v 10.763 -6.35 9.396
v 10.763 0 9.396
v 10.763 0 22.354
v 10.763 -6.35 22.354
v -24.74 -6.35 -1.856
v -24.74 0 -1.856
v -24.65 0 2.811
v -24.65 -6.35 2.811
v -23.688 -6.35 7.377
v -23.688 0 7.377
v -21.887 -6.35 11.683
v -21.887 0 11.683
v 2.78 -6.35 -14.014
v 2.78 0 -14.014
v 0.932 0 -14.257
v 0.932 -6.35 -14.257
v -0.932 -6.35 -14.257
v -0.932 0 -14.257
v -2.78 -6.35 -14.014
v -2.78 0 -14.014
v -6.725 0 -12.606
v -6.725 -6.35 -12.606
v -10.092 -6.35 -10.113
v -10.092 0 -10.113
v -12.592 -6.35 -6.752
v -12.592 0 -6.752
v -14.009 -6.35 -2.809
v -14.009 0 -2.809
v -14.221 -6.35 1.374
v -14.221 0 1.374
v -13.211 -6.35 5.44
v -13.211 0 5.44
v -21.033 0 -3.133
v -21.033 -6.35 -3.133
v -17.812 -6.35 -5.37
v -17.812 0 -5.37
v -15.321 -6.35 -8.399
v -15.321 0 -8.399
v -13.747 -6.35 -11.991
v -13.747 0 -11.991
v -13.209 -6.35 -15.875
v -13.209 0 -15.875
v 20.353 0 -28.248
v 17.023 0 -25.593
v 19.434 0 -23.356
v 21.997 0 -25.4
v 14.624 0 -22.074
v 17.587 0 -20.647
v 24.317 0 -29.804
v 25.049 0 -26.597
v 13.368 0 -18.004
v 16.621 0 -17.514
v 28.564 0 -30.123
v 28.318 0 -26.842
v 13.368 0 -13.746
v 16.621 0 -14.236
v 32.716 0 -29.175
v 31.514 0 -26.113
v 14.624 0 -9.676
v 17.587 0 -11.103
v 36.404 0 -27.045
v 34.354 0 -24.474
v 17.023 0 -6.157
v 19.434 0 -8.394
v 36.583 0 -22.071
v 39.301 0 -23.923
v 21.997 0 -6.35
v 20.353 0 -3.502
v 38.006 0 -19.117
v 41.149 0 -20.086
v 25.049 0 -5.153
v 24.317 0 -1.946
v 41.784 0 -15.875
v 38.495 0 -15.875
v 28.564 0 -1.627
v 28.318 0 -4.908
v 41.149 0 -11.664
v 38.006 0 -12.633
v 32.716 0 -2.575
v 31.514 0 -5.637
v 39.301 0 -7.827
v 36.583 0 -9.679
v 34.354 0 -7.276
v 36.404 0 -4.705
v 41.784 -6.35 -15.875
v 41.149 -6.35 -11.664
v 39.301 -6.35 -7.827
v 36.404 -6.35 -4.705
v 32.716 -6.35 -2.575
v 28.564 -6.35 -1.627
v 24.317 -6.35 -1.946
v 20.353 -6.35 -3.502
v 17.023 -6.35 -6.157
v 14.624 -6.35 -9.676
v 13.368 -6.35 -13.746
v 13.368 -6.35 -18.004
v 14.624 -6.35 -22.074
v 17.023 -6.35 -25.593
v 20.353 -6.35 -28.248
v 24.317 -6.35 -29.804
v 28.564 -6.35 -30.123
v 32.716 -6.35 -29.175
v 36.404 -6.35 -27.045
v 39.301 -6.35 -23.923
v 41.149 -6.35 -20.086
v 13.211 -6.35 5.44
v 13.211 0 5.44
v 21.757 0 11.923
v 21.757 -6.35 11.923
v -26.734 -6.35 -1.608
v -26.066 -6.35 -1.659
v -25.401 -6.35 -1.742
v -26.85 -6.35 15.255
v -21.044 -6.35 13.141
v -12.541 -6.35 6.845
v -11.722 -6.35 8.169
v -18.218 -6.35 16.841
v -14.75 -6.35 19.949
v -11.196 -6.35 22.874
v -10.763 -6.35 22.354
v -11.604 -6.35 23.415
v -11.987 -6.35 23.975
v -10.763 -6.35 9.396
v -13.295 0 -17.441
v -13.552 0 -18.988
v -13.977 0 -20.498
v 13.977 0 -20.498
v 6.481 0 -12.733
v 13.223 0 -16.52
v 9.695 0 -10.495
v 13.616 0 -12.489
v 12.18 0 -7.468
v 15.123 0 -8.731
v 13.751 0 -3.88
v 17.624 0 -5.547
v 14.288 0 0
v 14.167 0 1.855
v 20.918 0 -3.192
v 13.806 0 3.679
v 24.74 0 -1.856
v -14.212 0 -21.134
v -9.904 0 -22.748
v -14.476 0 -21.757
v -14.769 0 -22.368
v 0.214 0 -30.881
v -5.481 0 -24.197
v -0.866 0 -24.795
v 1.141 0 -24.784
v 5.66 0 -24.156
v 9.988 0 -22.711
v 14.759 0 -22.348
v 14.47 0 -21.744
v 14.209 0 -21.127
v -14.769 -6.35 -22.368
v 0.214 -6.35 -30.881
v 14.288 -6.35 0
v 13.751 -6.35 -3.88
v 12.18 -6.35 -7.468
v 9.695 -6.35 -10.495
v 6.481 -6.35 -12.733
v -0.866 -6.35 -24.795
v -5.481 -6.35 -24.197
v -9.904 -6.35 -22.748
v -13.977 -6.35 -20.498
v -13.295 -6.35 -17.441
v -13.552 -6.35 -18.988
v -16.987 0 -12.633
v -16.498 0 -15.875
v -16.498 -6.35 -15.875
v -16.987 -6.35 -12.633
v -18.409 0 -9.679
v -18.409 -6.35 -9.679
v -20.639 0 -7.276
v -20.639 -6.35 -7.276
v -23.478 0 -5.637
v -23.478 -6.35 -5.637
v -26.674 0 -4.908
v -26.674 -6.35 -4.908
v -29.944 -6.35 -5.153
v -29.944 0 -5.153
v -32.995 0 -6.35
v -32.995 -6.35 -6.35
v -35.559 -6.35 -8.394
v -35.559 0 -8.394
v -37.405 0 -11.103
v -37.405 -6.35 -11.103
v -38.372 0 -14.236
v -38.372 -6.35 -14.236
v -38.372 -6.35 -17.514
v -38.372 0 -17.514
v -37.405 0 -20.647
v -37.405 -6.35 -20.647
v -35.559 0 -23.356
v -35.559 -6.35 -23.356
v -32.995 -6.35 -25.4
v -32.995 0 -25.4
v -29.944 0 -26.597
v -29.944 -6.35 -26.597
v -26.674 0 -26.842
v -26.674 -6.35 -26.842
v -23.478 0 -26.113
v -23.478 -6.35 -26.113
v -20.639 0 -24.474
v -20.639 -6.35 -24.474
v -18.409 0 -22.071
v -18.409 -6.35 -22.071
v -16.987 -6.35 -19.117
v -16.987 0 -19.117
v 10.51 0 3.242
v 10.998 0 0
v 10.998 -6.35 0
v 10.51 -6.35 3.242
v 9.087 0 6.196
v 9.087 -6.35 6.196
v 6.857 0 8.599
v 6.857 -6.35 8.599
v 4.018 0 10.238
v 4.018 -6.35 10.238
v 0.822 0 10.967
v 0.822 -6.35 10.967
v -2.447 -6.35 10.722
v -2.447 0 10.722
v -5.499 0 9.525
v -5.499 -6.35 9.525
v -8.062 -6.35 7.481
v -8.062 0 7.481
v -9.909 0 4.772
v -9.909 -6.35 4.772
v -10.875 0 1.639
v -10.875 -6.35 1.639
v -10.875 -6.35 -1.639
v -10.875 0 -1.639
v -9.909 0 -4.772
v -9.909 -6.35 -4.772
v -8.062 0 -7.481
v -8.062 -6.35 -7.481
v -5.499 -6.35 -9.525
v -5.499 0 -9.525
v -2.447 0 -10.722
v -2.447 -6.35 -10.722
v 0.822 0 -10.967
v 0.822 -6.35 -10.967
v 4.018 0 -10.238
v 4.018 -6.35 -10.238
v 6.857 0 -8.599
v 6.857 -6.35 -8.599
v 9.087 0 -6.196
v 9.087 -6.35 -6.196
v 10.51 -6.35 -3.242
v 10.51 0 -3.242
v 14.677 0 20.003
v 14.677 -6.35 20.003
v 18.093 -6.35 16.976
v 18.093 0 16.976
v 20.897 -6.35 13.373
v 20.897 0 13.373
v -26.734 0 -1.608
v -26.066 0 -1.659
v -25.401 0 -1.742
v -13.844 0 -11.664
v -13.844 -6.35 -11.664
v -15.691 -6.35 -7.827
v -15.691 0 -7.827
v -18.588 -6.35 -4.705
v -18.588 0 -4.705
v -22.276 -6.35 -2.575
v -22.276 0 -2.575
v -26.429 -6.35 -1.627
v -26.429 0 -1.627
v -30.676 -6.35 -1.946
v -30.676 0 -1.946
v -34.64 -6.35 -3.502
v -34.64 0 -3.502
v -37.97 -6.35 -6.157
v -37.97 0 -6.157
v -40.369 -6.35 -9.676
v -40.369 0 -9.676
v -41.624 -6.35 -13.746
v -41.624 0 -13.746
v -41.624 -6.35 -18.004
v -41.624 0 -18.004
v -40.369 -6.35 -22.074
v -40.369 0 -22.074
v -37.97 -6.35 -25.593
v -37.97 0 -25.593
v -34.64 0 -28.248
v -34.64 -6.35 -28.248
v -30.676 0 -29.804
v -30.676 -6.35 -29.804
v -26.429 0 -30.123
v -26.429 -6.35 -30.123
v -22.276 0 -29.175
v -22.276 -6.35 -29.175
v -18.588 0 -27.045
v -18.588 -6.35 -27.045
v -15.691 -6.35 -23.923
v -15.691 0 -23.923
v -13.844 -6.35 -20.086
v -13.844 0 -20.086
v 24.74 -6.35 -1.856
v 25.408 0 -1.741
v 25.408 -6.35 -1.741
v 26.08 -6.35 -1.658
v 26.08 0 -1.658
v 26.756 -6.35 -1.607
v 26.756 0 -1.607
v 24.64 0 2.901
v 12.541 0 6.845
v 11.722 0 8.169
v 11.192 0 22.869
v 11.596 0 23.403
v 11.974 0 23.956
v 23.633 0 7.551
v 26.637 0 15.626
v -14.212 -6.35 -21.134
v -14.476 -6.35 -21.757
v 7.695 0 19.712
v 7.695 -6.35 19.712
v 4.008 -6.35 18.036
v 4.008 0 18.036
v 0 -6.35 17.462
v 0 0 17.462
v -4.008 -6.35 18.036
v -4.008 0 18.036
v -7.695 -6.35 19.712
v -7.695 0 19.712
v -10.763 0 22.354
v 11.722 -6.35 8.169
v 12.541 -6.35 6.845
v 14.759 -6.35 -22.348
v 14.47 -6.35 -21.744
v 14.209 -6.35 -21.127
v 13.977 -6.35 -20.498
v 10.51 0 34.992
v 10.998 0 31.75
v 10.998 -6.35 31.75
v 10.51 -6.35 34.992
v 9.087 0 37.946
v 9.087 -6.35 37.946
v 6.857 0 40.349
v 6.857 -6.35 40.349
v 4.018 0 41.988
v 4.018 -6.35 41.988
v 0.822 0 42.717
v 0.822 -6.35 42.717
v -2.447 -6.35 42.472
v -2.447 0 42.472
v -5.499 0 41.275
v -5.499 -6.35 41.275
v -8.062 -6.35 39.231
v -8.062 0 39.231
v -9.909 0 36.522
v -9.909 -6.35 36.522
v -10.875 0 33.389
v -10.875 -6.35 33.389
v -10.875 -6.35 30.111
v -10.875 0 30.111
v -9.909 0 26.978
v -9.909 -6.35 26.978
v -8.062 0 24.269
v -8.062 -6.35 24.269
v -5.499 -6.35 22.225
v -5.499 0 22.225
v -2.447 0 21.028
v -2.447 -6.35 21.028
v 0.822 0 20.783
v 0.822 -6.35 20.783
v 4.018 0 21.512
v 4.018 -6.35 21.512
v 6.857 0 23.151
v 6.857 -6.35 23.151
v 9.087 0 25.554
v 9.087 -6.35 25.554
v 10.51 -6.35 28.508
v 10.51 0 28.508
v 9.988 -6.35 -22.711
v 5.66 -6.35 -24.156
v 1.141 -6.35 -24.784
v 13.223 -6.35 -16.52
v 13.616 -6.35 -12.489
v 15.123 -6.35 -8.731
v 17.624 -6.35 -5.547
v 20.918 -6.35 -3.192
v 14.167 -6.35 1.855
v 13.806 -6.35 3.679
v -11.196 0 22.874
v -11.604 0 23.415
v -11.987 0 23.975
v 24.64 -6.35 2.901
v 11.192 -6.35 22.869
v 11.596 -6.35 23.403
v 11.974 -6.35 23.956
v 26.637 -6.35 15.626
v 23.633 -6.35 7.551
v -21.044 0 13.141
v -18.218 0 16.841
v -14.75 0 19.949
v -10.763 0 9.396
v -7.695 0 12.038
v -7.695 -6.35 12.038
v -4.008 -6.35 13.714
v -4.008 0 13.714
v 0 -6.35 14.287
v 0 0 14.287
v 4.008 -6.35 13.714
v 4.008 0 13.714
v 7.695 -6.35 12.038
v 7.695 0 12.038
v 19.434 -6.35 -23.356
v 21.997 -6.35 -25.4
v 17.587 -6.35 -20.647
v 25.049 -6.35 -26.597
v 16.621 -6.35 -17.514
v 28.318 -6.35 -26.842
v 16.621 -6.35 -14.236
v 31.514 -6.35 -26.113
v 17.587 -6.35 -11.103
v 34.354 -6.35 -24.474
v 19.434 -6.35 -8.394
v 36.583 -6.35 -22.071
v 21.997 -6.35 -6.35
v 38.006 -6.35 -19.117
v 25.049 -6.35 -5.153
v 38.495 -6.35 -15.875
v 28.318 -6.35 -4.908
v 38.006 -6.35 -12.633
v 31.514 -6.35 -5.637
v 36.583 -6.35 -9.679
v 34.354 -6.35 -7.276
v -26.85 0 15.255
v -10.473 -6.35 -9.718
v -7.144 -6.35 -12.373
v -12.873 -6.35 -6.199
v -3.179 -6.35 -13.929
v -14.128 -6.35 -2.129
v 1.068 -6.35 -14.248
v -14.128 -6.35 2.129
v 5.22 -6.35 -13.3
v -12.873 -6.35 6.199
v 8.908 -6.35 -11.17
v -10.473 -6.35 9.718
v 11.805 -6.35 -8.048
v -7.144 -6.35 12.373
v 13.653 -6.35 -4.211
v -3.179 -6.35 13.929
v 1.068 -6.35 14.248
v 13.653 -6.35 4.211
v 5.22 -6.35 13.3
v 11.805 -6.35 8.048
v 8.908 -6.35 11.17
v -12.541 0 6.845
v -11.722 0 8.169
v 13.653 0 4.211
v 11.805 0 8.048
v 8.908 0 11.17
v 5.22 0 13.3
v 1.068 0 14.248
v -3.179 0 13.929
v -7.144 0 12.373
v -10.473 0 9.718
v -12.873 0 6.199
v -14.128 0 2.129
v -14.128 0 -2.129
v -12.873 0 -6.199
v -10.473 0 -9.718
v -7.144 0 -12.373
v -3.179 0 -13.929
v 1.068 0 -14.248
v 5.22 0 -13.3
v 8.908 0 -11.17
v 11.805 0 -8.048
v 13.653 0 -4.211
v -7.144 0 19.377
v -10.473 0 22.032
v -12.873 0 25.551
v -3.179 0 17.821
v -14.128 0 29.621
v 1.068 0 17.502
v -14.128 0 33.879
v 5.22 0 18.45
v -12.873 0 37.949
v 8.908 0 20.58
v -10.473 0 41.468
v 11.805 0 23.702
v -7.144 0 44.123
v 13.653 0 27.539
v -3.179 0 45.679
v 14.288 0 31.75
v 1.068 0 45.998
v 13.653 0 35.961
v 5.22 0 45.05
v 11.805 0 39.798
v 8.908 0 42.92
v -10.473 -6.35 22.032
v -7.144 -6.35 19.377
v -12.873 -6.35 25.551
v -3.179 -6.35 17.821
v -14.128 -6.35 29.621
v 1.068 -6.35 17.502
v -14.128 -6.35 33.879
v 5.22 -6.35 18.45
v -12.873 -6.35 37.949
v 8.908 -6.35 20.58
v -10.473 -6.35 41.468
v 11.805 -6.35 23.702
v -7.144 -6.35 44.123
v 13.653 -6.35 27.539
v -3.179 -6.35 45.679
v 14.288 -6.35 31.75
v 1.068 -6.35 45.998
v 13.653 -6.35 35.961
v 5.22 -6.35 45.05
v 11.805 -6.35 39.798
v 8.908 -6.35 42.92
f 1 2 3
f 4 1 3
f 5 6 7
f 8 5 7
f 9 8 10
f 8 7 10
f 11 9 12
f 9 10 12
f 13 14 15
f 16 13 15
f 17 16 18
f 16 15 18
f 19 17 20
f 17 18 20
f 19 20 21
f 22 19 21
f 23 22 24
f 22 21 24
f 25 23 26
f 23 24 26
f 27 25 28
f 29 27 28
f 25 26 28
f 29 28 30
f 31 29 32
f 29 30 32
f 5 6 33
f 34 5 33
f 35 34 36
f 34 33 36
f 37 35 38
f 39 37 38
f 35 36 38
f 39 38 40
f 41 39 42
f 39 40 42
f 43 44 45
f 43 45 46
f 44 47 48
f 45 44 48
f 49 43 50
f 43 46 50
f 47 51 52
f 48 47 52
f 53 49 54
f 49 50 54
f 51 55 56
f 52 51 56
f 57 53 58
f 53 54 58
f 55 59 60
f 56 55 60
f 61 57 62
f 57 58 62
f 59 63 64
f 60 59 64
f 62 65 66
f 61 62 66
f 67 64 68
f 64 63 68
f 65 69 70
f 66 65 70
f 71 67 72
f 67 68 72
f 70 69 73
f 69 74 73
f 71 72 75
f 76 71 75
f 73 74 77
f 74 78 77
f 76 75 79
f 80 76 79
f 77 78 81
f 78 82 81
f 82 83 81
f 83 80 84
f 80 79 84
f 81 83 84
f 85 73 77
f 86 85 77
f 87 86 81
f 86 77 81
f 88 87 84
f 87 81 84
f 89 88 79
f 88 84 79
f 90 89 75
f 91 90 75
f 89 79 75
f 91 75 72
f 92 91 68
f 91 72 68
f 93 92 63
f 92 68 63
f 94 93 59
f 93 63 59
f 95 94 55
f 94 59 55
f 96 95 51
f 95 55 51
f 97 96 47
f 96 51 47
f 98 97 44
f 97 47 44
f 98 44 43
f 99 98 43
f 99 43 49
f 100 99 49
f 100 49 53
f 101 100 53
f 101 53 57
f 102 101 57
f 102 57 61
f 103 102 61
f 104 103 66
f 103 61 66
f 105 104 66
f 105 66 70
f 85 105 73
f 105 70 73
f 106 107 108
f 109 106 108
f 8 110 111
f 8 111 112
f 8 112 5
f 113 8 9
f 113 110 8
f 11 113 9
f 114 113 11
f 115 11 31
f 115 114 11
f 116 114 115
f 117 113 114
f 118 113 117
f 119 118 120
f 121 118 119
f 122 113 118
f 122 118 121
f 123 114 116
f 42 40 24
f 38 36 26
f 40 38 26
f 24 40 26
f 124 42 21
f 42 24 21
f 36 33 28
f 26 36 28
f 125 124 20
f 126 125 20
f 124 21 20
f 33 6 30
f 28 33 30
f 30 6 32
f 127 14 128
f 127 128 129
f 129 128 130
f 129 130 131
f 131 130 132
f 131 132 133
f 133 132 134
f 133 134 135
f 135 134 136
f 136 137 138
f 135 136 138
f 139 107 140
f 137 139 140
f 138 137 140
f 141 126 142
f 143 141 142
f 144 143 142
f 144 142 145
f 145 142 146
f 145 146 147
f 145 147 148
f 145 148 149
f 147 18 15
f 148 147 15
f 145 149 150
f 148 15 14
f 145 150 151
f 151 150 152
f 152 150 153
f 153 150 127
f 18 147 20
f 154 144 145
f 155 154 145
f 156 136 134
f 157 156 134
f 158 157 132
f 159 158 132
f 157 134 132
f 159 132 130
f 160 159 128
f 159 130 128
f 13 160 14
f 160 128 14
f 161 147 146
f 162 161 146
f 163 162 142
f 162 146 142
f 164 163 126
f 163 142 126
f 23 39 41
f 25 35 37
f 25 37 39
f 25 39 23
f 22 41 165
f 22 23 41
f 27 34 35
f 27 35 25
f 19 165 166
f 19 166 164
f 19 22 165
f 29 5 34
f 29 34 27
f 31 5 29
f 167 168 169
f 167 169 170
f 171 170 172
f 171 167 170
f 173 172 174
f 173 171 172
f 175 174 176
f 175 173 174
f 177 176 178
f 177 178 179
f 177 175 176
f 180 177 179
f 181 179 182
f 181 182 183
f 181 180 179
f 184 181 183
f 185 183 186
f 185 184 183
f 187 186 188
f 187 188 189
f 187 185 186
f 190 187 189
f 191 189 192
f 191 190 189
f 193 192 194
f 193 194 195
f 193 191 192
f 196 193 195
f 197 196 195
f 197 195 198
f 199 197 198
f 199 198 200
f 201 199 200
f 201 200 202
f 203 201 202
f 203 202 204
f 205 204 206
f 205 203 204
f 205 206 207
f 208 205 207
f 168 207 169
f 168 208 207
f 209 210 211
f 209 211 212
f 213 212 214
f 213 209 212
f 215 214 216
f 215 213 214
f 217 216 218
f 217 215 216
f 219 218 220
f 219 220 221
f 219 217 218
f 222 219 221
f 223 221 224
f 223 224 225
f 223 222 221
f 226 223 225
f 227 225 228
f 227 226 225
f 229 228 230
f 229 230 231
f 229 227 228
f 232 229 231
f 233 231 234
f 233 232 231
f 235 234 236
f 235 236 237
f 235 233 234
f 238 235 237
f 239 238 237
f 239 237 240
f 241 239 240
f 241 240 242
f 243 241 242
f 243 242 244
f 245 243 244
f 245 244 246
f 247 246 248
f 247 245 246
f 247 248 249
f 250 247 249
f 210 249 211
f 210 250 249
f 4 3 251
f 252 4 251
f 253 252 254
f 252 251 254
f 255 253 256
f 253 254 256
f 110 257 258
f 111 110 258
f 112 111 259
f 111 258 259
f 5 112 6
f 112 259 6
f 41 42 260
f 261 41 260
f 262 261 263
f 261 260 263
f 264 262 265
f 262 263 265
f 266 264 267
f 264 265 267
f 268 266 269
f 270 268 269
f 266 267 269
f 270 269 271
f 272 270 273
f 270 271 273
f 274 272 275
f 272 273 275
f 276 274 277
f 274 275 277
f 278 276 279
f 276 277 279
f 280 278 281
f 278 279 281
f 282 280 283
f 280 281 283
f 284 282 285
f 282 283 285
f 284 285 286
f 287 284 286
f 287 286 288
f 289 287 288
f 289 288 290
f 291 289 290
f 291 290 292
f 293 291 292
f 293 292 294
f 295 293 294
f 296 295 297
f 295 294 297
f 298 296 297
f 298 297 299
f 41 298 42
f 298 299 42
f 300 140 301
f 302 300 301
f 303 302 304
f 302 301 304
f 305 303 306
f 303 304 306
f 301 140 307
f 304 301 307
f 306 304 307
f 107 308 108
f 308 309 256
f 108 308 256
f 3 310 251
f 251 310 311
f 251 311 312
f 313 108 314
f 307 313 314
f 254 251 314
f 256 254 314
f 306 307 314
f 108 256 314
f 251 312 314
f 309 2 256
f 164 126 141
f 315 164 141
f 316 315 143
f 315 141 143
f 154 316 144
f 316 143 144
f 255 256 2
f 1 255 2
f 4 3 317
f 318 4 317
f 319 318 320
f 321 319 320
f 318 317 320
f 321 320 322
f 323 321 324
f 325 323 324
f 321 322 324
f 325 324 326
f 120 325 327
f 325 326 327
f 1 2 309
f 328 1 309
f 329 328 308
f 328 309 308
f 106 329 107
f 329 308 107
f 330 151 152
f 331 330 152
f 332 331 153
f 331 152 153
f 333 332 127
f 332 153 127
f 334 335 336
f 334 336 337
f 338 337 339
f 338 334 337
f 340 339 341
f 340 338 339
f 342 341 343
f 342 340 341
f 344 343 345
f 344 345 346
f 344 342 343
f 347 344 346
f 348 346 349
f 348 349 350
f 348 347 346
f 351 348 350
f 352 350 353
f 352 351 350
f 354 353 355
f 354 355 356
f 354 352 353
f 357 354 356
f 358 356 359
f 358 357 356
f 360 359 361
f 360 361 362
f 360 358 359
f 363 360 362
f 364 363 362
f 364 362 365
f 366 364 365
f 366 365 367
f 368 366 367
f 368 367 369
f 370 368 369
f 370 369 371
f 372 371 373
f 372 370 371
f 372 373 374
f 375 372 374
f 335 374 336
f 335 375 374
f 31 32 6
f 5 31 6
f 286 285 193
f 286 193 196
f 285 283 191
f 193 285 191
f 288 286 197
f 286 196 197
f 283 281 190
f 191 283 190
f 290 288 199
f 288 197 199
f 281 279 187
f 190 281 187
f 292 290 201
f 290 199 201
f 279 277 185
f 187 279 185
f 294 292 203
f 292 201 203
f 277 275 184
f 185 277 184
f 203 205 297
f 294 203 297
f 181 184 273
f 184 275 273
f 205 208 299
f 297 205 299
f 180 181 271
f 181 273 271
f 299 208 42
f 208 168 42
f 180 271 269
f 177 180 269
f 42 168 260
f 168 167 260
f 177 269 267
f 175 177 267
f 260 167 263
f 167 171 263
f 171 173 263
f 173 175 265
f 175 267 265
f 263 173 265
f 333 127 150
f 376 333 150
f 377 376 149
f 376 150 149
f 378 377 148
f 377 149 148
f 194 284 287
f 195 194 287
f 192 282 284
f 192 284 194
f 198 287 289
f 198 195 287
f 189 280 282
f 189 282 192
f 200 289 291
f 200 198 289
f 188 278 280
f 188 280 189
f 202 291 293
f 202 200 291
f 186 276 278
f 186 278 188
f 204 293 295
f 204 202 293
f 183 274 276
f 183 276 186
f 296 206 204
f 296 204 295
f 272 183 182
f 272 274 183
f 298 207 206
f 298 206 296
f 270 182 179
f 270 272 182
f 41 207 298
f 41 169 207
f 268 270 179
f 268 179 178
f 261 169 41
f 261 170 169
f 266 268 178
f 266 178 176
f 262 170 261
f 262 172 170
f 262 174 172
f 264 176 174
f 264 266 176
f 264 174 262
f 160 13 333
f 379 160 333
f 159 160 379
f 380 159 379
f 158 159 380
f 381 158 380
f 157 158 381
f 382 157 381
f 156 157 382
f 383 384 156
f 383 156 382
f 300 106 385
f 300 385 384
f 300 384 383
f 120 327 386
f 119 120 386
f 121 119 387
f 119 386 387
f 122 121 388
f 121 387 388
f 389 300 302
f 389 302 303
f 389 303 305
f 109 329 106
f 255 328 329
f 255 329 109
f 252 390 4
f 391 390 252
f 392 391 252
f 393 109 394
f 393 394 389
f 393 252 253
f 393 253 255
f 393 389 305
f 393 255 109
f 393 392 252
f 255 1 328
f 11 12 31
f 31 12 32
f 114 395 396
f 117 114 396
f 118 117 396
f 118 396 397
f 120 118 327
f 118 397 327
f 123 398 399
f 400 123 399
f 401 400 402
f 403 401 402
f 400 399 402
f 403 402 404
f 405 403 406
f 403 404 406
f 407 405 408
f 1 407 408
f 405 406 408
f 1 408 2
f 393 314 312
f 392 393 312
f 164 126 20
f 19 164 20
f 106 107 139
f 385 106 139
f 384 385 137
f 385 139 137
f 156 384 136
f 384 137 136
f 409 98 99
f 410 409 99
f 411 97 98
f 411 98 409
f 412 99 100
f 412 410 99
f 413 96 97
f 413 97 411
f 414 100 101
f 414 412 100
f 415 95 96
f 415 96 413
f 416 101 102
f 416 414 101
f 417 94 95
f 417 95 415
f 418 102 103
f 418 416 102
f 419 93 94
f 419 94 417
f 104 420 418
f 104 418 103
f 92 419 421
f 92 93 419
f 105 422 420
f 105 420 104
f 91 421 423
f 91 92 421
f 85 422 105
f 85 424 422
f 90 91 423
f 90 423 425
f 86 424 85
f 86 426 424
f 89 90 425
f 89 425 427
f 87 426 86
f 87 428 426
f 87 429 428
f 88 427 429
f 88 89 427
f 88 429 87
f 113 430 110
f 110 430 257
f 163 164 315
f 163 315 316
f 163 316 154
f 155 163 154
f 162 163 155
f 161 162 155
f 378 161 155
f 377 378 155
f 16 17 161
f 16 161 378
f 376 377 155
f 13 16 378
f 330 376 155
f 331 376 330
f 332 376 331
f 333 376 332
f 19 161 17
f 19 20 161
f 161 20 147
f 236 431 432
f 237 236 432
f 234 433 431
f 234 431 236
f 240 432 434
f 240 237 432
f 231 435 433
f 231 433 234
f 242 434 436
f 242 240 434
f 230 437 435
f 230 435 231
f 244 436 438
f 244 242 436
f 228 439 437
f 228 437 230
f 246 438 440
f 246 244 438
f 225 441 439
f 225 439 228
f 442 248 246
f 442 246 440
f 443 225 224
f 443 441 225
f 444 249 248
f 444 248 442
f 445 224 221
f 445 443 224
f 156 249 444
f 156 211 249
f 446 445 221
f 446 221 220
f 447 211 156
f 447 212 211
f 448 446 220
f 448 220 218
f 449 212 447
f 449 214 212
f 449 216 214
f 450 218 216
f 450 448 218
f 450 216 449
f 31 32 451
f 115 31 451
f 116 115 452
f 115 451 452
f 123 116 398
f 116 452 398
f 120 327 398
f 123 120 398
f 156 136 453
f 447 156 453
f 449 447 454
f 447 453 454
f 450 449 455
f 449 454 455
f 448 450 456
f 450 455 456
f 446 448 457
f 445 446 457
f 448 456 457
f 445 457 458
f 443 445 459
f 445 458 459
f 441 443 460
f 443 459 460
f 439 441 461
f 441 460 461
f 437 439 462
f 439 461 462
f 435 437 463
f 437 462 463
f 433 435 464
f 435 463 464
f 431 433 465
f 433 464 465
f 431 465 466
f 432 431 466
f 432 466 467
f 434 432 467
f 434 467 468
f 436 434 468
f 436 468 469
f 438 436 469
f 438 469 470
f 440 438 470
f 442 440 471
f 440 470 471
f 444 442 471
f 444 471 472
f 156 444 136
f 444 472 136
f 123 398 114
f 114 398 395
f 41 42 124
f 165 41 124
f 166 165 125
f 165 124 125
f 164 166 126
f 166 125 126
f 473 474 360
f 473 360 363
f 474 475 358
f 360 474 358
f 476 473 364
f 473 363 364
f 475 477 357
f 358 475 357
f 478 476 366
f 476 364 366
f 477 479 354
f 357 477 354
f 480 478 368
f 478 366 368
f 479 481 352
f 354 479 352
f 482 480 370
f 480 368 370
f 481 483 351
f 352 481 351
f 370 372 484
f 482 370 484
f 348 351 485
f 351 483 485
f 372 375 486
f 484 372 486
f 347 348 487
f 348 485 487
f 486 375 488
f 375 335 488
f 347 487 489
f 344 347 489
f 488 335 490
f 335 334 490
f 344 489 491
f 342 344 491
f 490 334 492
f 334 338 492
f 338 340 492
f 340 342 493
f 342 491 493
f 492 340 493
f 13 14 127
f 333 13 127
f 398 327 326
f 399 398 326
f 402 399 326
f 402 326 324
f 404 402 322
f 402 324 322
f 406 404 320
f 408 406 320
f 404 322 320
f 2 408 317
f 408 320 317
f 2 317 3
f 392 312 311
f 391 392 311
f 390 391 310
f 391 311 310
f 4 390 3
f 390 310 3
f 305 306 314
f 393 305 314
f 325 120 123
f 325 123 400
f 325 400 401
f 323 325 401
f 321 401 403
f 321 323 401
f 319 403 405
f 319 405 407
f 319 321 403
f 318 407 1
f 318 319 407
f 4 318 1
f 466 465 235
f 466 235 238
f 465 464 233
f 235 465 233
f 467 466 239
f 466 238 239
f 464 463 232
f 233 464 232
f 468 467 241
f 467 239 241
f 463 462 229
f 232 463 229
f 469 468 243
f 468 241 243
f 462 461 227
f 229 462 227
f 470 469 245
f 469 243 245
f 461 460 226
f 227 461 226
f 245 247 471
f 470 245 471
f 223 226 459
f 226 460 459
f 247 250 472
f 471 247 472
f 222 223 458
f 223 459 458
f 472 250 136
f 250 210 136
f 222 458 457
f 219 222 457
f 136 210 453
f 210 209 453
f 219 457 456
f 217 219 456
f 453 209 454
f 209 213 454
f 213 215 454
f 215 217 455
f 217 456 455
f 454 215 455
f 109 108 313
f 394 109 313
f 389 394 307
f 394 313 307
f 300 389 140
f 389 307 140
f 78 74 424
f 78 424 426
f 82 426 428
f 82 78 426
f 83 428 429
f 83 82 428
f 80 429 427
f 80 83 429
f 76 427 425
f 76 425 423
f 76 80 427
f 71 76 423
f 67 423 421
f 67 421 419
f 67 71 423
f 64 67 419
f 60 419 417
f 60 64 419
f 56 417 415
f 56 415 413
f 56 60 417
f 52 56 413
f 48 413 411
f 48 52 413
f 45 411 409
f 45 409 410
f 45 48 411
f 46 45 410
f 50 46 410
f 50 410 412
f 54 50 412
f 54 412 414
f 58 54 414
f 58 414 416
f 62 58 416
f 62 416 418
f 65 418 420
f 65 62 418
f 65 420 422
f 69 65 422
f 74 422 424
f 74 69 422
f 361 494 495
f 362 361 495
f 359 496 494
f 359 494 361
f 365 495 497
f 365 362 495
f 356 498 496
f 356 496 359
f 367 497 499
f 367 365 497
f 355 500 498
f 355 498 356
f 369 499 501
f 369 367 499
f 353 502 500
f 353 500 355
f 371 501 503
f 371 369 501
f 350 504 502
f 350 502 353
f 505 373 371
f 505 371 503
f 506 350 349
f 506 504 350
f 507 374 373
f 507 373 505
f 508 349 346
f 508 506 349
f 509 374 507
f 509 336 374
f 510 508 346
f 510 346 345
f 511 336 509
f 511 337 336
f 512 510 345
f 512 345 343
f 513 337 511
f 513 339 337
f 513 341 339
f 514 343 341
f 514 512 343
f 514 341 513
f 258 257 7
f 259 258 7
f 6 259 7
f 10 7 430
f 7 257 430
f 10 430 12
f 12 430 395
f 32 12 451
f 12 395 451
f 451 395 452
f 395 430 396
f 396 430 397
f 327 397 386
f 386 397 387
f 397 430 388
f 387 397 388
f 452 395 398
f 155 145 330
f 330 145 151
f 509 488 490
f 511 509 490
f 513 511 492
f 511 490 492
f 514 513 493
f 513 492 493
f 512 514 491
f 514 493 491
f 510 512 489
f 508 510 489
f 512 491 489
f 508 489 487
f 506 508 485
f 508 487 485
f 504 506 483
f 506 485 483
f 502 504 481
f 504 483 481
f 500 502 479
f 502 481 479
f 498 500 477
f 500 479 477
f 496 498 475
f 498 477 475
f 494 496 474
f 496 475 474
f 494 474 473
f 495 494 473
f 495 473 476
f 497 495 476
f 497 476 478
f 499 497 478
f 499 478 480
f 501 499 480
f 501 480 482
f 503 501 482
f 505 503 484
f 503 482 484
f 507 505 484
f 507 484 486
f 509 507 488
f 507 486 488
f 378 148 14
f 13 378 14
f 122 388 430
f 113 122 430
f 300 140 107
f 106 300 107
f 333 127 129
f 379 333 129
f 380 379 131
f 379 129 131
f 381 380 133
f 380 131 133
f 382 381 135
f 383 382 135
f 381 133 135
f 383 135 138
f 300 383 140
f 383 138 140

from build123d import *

# Parameters (mm, degrees)
F0_R     = 14.2875
F0_R_2   = 10.9982
F2_DEPTH = 6.35


with BuildPart() as f2:
    # F0 (on Front) → F2 (new body)
    with BuildSketch(Plane.XZ):
        with Locations((27.4963065702, -15.875)):
            Circle(F0_R)
        with Locations((27.4963065702, -15.875)):
            Circle(F0_R_2, mode=Mode.SUBTRACT)
    extrude(amount=F2_DEPTH)


with BuildPart() as f2b:
    # F0 (on Front) → F2, piece 2 (new body)
    with BuildSketch(Plane.XZ):
        Circle(F0_R)
        Circle(F0_R_2, mode=Mode.SUBTRACT)
    extrude(amount=F2_DEPTH)


with BuildPart() as f2c:
    # F0 (on Front) → F2, piece 3 (new body)
    with BuildSketch(Plane.XZ):
        with Locations((0, 31.75)):
            Circle(F0_R)
        with Locations((0, 31.75)):
            Circle(F0_R_2, mode=Mode.SUBTRACT)
    extrude(amount=F2_DEPTH)


with BuildPart() as f2d:
    # F0 (on Front) → F2, piece 4 (new body)
    with BuildSketch(Plane.XZ):
        with Locations((-27.4963065702, -15.875)):
            Circle(F0_R)
        with Locations((-27.4963065702, -15.875)):
            Circle(F0_R_2, mode=Mode.SUBTRACT)
    extrude(amount=F2_DEPTH)


with BuildPart() as f2e:
    # F1 (on Front) → F2, piece 5 (new body)
    with BuildSketch(Plane.XZ):
        with BuildLine():
            Line((24.7404177955, -1.8558083931), (13.2113221809, 5.4400020663))
            ThreePointArc((13.2113221809, 5.4400020663), (14.0158735352, 2.7727144272), (14.2875, 0))
            ThreePointArc((14.2875, 0), (11.0419198775, -9.0668992312), (2.7797258382, -14.0144846682))
            Line((2.7797258382, -14.0144846682), (13.9773861107, -20.4979261146))
            ThreePointArc((13.9773861107, -20.4979261146), (15.1229686136, -8.73125), (24.7404177955, -1.8558083931))
        make_face()
    extrude(amount=F2_DEPTH)


with BuildPart() as f2f:
    # F1 (on Front) → F2, piece 6 (new body)
    with BuildSketch(Plane.XZ):
        with BuildLine():
            ThreePointArc((10.7630316848, 22.3537345077), (0, 17.4625), (-10.7630316848, 22.3537345077))
            Line((-10.7630316848, 22.3537345077), (-10.7630316848, 9.3962654923))
            ThreePointArc((-10.7630316848, 9.3962654923), (0, 14.2875), (10.7630316848, 9.3962654923))
            Line((10.7630316848, 9.3962654923), (10.7630316848, 22.3537345077))
        make_face()
    extrude(amount=F2_DEPTH)


with BuildPart() as f2g:
    # F1 (on Front) → F2, piece 7 (new body)
    with BuildSketch(Plane.XZ):
        with BuildLine():
            ThreePointArc((-2.7797258382, -14.0144846682), (-12.5915712964, -6.751665612), (-13.2113221809, 5.4400020663))
            Line((-13.2113221809, 5.4400020663), (-24.7404177955, -1.8558083931))
            ThreePointArc((-24.7404177955, -1.8558083931), (-16.4621002752, -6.7987150942), (-13.2088065702, -15.875))
            ThreePointArc((-13.2088065702, -15.875), (-13.4022611553, -18.2181901529), (-13.9773861107, -20.4979261146))
            Line((-13.9773861107, -20.4979261146), (-2.7797258382, -14.0144846682))
        make_face()
    extrude(amount=F2_DEPTH)


with BuildPart() as f2h:
    # F1 (on Front) → F2, piece 8 (new body)
    with BuildSketch(Plane.XZ):
        with BuildLine():
            ThreePointArc((2.7797258382, -14.0144846682), (0, -14.2875), (-2.7797258382, -14.0144846682))
            Line((-2.7797258382, -14.0144846682), (-0.8663058881, -24.7947940422))
            ThreePointArc((-0.8663058881, -24.7947940422), (0.1376769661, -24.8095413609), (1.141434315, -24.783652378))
            Line((1.141434315, -24.783652378), (2.7797258382, -14.0144846682))
        make_face()
        with BuildLine():
            ThreePointArc((-13.9773861107, -20.4979261146), (-14.3401220421, -21.4470252075), (-14.7693931554, -22.3679447236))
            Line((-14.7693931554, -22.3679447236), (0.2138989984, -30.880725603))
            Line((0.2138989984, -30.880725603), (14.7592758228, -22.3480753118))
            ThreePointArc((14.7592758228, -22.3480753118), (14.33577822, -21.4367577971), (13.9773861107, -20.4979261146))
            ThreePointArc((13.9773861107, -20.4979261146), (7.8572606656, -23.5328653657), (1.141434315, -24.783652378))
            ThreePointArc((1.141434315, -24.783652378), (0.1376769661, -24.8095413609), (-0.8663058881, -24.7947940422))
            ThreePointArc((-0.8663058881, -24.7947940422), (-7.7265494586, -23.5761050844), (-13.9773861107, -20.4979261146))
        make_face()
    extrude(amount=F2_DEPTH)


with BuildPart() as f2i:
    # F1 (on Front) → F2, piece 9 (new body)
    with BuildSketch(Plane.XZ):
        with BuildLine():
            ThreePointArc((21.7569112787, 11.9234688367), (21.3393208303, 12.6556581808), (20.8970993022, 13.3732396315))
            Line((20.8970993022, 13.3732396315), (10.7630316848, 9.3962654923))
            ThreePointArc((10.7630316848, 9.3962654923), (12.14929693, 7.5184599724), (13.2113221809, 5.4400020663))
            Line((13.2113221809, 5.4400020663), (21.7569112787, 11.9234688367))
        make_face()
        with BuildLine():
            Line((26.6365433603, 15.6256047679), (11.9743630343, 23.9559454599))
            ThreePointArc((11.9743630343, 23.9559454599), (11.3968877171, 23.1335270201), (10.7630316848, 22.3537345077))
            ThreePointArc((10.7630316848, 22.3537345077), (16.454582814, 18.5682255992), (20.8970993022, 13.3732396315))
            ThreePointArc((20.8970993022, 13.3732396315), (21.3393208303, 12.6556581808), (21.7569112787, 11.9234688367))
            ThreePointArc((21.7569112787, 11.9234688367), (24.2480416323, 5.2502166132), (24.7404177955, -1.8558083931))
            ThreePointArc((24.7404177955, -1.8558083931), (25.7437296863, -1.6953973781), (26.7559049388, -1.6066973093))
            Line((26.7559049388, -1.6066973093), (26.6365433603, 15.6256047679))
        make_face()
    extrude(amount=F2_DEPTH)


with BuildPart() as f2j:
    # F1 (on Front) → F2, piece 10 (new body)
    with BuildSketch(Plane.XZ):
        with BuildLine():
            Line((-10.7630316848, 9.3962654923), (-21.0441967437, 13.140551012))
            ThreePointArc((-21.0441967437, 13.140551012), (-21.4779011139, 12.4190201396), (-21.8868764431, 11.6831903628))
            Line((-21.8868764431, 11.6831903628), (-13.2113221809, 5.4400020663))
            ThreePointArc((-13.2113221809, 5.4400020663), (-12.14929693, 7.5184599724), (-10.7630316848, 9.3962654923))
        make_face()
        with BuildLine():
            ThreePointArc((-10.7630316848, 22.3537345077), (-11.4036076442, 23.1424225855), (-11.9865117834, 23.9746420329))
            Line((-11.9865117834, 23.9746420329), (-26.8504423587, 15.255120835))
            Line((-26.8504423587, 15.255120835), (-26.7336388571, -1.6078701482))
            ThreePointArc((-26.7336388571, -1.6078701482), (-25.7326659371, -1.6967692229), (-24.7404177955, -1.8558083931))
            ThreePointArc((-24.7404177955, -1.8558083931), (-24.2765785034, 5.1166428112), (-21.8868764431, 11.6831903628))
            ThreePointArc((-21.8868764431, 11.6831903628), (-21.4779011139, 12.4190201396), (-21.0441967437, 13.140551012))
            ThreePointArc((-21.0441967437, 13.140551012), (-16.5573437666, 18.476651885), (-10.7630316848, 22.3537345077))
        make_face()
    extrude(amount=F2_DEPTH)


solid = Compound([f2.part, f2b.part, f2c.part, f2d.part, f2e.part, f2f.part, f2g.part, f2h.part, f2i.part, f2j.part])
